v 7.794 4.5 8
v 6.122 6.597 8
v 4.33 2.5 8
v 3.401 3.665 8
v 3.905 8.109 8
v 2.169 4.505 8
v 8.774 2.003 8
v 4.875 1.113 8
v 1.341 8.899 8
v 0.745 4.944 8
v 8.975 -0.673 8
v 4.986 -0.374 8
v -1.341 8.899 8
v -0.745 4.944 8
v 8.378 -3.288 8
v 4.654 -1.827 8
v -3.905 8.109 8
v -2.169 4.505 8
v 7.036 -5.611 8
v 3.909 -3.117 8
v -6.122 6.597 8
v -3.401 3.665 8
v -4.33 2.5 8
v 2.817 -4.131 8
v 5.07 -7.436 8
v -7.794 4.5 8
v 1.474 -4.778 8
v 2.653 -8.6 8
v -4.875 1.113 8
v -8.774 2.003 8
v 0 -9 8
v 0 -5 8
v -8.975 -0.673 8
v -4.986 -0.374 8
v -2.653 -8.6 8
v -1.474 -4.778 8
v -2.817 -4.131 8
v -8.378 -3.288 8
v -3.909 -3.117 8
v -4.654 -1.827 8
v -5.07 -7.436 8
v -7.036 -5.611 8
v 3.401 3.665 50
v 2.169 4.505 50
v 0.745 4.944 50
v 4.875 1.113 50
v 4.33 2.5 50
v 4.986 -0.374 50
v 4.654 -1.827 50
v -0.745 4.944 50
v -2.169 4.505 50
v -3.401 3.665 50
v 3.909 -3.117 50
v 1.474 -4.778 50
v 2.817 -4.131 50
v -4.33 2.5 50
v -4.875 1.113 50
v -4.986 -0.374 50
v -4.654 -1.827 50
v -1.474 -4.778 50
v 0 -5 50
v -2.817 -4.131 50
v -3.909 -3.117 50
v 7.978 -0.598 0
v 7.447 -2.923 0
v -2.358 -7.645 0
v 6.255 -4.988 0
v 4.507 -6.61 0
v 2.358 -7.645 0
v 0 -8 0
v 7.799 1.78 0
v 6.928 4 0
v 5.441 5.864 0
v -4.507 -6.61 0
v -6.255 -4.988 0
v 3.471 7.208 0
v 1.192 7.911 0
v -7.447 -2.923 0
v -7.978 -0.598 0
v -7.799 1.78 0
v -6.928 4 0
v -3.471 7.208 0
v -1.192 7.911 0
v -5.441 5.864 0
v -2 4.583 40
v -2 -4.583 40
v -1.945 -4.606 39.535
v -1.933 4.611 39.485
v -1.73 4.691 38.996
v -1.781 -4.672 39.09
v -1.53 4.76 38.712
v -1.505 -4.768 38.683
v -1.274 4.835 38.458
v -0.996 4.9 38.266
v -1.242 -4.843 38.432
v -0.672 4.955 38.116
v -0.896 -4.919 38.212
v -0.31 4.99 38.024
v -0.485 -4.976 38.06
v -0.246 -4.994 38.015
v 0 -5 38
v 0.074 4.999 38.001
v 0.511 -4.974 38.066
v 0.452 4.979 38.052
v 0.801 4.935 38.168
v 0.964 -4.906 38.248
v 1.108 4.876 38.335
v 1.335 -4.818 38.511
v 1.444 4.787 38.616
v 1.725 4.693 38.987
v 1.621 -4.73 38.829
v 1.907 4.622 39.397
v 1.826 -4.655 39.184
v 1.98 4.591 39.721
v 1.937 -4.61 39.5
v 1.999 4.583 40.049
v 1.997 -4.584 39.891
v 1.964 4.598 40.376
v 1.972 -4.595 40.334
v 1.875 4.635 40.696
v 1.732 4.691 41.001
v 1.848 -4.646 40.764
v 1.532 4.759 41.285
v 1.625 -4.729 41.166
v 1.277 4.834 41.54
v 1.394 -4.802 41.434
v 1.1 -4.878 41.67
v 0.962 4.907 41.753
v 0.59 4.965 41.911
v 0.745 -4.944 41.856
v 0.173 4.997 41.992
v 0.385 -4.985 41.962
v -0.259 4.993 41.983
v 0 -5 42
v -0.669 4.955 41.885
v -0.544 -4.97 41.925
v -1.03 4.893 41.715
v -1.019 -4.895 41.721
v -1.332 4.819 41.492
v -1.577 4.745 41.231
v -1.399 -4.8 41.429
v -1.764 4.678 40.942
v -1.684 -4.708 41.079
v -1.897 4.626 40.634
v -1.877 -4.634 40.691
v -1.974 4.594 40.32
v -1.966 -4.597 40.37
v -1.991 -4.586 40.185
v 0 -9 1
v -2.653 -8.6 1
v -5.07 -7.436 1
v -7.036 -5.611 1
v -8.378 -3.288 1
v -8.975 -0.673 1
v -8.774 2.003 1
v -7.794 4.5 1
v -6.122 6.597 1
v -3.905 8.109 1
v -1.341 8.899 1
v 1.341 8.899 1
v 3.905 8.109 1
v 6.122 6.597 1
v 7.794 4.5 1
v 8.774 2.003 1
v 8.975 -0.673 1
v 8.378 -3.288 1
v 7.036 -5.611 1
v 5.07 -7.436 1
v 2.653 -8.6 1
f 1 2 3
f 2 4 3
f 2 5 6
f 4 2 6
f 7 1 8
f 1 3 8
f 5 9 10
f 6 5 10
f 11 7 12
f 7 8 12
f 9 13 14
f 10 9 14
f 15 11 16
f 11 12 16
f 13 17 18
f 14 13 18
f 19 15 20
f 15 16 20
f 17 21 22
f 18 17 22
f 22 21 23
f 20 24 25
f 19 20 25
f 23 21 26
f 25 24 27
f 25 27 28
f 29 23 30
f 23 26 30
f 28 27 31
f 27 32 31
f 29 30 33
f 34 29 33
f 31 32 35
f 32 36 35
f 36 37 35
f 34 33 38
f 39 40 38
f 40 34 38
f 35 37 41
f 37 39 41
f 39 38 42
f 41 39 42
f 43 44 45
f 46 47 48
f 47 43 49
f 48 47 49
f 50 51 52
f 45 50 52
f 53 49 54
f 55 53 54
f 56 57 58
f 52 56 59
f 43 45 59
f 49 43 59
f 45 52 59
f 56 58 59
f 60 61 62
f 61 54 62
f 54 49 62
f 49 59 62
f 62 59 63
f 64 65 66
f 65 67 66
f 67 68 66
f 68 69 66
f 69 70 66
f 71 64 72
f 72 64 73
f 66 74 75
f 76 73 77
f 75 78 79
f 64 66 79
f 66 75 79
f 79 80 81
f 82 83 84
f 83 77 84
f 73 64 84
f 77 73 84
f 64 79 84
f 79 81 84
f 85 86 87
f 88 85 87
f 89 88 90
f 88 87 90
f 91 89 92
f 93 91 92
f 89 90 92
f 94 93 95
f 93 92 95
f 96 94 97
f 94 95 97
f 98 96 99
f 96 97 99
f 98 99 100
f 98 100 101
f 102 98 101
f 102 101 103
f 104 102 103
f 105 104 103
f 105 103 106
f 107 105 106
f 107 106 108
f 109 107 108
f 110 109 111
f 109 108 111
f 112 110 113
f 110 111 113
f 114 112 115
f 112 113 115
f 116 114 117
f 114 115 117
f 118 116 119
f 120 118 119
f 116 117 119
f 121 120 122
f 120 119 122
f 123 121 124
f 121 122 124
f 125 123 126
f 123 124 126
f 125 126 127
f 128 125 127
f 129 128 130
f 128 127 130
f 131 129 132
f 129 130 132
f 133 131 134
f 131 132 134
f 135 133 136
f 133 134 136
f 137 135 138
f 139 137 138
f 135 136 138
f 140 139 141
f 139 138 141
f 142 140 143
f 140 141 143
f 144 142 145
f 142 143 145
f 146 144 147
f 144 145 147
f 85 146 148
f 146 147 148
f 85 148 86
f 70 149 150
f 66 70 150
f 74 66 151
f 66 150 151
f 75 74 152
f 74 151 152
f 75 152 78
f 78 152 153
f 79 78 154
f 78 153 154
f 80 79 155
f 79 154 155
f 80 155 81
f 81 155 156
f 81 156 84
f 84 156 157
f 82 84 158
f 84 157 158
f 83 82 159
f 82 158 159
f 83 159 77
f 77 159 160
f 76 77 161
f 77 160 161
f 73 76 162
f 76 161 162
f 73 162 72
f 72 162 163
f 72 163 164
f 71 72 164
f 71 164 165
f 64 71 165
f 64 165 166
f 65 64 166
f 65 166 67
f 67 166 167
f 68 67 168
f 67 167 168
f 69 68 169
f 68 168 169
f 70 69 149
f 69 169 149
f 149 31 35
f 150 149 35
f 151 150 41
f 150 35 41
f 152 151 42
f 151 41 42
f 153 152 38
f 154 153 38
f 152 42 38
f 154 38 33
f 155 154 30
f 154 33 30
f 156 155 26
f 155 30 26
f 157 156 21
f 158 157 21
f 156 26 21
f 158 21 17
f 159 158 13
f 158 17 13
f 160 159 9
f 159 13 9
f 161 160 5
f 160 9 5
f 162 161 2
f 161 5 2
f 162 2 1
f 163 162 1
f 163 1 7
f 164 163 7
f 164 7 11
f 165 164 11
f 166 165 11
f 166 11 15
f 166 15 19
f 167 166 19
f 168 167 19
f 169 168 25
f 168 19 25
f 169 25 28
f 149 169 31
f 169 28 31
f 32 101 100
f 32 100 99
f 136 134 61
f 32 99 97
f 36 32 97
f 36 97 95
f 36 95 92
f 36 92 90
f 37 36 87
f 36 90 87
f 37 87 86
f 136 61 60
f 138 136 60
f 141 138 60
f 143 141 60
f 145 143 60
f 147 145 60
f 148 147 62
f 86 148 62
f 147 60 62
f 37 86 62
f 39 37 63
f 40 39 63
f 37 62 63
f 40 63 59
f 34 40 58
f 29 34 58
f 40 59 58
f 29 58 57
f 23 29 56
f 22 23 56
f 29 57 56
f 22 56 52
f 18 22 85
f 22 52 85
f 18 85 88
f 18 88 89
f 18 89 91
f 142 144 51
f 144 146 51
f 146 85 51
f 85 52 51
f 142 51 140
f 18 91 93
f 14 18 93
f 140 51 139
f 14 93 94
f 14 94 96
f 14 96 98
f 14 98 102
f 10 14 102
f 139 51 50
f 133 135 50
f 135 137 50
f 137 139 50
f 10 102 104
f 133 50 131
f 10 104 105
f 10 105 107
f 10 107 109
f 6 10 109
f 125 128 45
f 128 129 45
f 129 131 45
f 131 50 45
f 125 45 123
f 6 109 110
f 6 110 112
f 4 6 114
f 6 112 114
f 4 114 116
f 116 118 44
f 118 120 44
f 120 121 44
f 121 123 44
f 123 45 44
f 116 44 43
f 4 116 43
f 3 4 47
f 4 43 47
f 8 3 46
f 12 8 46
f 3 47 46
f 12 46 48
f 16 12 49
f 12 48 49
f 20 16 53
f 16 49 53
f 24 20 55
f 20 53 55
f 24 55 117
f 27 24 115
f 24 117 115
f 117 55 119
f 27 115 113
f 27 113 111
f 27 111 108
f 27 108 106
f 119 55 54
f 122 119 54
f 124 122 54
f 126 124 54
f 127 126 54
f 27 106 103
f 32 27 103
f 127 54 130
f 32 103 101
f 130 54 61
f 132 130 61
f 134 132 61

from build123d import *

# Parameters (mm, degrees)
MM_1_D         = 4
CHAMFER_1_SIZE = 1


with BuildPart() as part:
    # 草图1 → 旋转1 (revolve)
    with BuildSketch(Plane(origin=(0, 0, 0), x_dir=(0, 0, -1), z_dir=(1, 0, 0)), mode=Mode.PRIVATE) as revolve_1_sk:
        Polygon((0, 0), (0, 9), (-8, 9), (-8, 5), (-50, 5), (-50, 0), align=None)
    revolve(revolve_1_sk.sketch.rotate(Axis((0, 0, 50), (0, 0, -1)), 180), axis=Axis((0, 0, 50), (0, 0, -1)))

    # 大小mm 暗销孔1 (through all)
    with Locations(Plane(origin=(0, 5, 40), x_dir=(1, 0, 0), z_dir=(0, 1, 0))):
        with Locations((0, 0)):
            Hole(MM_1_D / 2)

    # 倒角1
    chamfer_1_edges = [part.edges().sort_by_distance(p)[0] for p in [
        (0, 9, 0),
    ]]
    chamfer(chamfer_1_edges, length=CHAMFER_1_SIZE)


solid = part.part
